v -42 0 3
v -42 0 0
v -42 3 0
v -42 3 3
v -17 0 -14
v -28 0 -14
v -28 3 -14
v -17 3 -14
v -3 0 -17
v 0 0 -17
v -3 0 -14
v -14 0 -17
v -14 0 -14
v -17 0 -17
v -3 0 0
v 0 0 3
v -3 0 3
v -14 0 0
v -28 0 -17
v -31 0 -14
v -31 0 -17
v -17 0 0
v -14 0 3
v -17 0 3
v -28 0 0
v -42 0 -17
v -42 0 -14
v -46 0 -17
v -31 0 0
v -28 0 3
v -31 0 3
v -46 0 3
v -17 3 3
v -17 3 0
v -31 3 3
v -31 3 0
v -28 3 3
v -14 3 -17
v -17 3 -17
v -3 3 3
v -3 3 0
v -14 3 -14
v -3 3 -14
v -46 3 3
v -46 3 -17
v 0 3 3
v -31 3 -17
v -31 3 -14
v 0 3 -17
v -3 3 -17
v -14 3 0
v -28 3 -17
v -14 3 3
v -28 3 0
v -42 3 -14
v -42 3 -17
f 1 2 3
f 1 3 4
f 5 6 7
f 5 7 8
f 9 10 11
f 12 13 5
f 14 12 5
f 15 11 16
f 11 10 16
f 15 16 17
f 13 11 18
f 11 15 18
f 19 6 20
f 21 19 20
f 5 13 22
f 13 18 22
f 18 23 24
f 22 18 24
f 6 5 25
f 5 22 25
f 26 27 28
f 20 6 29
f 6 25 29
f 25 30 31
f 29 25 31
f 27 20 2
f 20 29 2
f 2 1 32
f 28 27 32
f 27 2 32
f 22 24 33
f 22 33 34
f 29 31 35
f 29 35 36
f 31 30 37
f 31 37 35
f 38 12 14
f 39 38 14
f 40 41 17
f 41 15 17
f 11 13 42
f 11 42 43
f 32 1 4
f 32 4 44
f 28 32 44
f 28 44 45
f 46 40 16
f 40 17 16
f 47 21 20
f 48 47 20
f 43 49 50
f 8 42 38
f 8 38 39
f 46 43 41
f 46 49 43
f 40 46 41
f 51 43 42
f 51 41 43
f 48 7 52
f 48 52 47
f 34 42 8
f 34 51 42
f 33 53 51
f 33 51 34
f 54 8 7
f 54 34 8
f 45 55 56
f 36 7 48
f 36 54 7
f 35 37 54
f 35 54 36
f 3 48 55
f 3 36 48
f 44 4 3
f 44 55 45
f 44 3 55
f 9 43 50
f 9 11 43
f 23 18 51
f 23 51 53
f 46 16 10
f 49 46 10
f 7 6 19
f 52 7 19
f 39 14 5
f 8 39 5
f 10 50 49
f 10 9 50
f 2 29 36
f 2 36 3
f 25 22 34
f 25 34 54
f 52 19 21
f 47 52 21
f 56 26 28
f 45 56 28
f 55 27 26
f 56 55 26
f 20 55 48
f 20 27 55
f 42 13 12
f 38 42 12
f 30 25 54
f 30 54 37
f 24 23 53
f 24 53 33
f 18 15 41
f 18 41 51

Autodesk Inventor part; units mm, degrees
ref_plane "YZ Plane" through (0, 0, 0) normal (1, 0, 0) x (0, 1, 0)
ref_plane "XZ Plane" through (0, 0, 0) normal (0, 1, 0) x (-1, 0, 0)
ref_plane "XY Plane" through (0, 0, 0) normal (0, 0, 1) x (1, 0, 0)
sketch "草圖2" plane through (0, 0, 0) normal (0, 1, 0) x (-1, 0, 0)
  line L0 (0, 0) -> (31, 0)
  line L1 (31, 0) -> (31, -14)
  line L2 (31, -14) -> (0, -14)
  line L3 (0, -14) -> (0, 0)
  line L4 (31, -14) -> (28, -14)
  line L5 (28, -14) -> (28, -17)
  line L6 (28, -17) -> (31, -17)
  line L7 (31, -17) -> (31, -14)
  line L8 (31, -7) -> (0, -7)
  line L9 (15.5, -14) -> (15.5, 0)
  line L10 (28, 0) -> (28, 3)
  line L11 (28, 3) -> (31, 3)
  line L12 (31, 3) -> (31, 0)
  line L13 (3, -14) -> (3, -17)
  line L14 (3, -17) -> (0, -17)
  line L15 (0, -17) -> (0, -14)
  line L16 (3, 0) -> (3, 3)
  line L17 (3, 3) -> (0, 3)
  line L18 (0, 3) -> (0, 0)
  line L19 (17, -14) -> (14, -14)
  line L20 (14, -14) -> (14, -17)
  line L21 (14, -17) -> (17, -17)
  line L22 (17, -17) -> (17, -14)
  line L23 (14, 0) -> (14, 3)
  line L24 (14, 3) -> (17, 3)
  line L25 (17, 3) -> (17, 0)
  line L26 (31, 0) -> (46, 0)
  line L27 (46, 0) -> (46, -14)
  line L28 (46, -14) -> (31, -14)
  line L29 (31, -14) -> (31, 0)
  line L30 (45, -14) -> (42, -14)
  line L31 (42, -14) -> (42, -17)
  line L32 (42, 0) -> (42, 3)
  line L33 (42, -17) -> (46, -17)
  line L34 (46, -14) -> (46, -17)
  line L35 (42, 3) -> (46, 3)
  line L36 (46, 0) -> (46, 3)
  point P0 (44, 3)
  dimension "d9" = 31
  dimension "d10" = 14
  dimension "d11" = 3
  dimension "d12" = 3
  dimension "d13" = 3
  dimension "d14" = 3
  dimension "d18" = 11
  dimension "d21" = 14
  dimension "d22" = 46
  dimension "d23" = 20
extrude "擠出2" add sketch "草圖2" along normal blind 3
properties material "MDF Medium Density Fiberboard"
